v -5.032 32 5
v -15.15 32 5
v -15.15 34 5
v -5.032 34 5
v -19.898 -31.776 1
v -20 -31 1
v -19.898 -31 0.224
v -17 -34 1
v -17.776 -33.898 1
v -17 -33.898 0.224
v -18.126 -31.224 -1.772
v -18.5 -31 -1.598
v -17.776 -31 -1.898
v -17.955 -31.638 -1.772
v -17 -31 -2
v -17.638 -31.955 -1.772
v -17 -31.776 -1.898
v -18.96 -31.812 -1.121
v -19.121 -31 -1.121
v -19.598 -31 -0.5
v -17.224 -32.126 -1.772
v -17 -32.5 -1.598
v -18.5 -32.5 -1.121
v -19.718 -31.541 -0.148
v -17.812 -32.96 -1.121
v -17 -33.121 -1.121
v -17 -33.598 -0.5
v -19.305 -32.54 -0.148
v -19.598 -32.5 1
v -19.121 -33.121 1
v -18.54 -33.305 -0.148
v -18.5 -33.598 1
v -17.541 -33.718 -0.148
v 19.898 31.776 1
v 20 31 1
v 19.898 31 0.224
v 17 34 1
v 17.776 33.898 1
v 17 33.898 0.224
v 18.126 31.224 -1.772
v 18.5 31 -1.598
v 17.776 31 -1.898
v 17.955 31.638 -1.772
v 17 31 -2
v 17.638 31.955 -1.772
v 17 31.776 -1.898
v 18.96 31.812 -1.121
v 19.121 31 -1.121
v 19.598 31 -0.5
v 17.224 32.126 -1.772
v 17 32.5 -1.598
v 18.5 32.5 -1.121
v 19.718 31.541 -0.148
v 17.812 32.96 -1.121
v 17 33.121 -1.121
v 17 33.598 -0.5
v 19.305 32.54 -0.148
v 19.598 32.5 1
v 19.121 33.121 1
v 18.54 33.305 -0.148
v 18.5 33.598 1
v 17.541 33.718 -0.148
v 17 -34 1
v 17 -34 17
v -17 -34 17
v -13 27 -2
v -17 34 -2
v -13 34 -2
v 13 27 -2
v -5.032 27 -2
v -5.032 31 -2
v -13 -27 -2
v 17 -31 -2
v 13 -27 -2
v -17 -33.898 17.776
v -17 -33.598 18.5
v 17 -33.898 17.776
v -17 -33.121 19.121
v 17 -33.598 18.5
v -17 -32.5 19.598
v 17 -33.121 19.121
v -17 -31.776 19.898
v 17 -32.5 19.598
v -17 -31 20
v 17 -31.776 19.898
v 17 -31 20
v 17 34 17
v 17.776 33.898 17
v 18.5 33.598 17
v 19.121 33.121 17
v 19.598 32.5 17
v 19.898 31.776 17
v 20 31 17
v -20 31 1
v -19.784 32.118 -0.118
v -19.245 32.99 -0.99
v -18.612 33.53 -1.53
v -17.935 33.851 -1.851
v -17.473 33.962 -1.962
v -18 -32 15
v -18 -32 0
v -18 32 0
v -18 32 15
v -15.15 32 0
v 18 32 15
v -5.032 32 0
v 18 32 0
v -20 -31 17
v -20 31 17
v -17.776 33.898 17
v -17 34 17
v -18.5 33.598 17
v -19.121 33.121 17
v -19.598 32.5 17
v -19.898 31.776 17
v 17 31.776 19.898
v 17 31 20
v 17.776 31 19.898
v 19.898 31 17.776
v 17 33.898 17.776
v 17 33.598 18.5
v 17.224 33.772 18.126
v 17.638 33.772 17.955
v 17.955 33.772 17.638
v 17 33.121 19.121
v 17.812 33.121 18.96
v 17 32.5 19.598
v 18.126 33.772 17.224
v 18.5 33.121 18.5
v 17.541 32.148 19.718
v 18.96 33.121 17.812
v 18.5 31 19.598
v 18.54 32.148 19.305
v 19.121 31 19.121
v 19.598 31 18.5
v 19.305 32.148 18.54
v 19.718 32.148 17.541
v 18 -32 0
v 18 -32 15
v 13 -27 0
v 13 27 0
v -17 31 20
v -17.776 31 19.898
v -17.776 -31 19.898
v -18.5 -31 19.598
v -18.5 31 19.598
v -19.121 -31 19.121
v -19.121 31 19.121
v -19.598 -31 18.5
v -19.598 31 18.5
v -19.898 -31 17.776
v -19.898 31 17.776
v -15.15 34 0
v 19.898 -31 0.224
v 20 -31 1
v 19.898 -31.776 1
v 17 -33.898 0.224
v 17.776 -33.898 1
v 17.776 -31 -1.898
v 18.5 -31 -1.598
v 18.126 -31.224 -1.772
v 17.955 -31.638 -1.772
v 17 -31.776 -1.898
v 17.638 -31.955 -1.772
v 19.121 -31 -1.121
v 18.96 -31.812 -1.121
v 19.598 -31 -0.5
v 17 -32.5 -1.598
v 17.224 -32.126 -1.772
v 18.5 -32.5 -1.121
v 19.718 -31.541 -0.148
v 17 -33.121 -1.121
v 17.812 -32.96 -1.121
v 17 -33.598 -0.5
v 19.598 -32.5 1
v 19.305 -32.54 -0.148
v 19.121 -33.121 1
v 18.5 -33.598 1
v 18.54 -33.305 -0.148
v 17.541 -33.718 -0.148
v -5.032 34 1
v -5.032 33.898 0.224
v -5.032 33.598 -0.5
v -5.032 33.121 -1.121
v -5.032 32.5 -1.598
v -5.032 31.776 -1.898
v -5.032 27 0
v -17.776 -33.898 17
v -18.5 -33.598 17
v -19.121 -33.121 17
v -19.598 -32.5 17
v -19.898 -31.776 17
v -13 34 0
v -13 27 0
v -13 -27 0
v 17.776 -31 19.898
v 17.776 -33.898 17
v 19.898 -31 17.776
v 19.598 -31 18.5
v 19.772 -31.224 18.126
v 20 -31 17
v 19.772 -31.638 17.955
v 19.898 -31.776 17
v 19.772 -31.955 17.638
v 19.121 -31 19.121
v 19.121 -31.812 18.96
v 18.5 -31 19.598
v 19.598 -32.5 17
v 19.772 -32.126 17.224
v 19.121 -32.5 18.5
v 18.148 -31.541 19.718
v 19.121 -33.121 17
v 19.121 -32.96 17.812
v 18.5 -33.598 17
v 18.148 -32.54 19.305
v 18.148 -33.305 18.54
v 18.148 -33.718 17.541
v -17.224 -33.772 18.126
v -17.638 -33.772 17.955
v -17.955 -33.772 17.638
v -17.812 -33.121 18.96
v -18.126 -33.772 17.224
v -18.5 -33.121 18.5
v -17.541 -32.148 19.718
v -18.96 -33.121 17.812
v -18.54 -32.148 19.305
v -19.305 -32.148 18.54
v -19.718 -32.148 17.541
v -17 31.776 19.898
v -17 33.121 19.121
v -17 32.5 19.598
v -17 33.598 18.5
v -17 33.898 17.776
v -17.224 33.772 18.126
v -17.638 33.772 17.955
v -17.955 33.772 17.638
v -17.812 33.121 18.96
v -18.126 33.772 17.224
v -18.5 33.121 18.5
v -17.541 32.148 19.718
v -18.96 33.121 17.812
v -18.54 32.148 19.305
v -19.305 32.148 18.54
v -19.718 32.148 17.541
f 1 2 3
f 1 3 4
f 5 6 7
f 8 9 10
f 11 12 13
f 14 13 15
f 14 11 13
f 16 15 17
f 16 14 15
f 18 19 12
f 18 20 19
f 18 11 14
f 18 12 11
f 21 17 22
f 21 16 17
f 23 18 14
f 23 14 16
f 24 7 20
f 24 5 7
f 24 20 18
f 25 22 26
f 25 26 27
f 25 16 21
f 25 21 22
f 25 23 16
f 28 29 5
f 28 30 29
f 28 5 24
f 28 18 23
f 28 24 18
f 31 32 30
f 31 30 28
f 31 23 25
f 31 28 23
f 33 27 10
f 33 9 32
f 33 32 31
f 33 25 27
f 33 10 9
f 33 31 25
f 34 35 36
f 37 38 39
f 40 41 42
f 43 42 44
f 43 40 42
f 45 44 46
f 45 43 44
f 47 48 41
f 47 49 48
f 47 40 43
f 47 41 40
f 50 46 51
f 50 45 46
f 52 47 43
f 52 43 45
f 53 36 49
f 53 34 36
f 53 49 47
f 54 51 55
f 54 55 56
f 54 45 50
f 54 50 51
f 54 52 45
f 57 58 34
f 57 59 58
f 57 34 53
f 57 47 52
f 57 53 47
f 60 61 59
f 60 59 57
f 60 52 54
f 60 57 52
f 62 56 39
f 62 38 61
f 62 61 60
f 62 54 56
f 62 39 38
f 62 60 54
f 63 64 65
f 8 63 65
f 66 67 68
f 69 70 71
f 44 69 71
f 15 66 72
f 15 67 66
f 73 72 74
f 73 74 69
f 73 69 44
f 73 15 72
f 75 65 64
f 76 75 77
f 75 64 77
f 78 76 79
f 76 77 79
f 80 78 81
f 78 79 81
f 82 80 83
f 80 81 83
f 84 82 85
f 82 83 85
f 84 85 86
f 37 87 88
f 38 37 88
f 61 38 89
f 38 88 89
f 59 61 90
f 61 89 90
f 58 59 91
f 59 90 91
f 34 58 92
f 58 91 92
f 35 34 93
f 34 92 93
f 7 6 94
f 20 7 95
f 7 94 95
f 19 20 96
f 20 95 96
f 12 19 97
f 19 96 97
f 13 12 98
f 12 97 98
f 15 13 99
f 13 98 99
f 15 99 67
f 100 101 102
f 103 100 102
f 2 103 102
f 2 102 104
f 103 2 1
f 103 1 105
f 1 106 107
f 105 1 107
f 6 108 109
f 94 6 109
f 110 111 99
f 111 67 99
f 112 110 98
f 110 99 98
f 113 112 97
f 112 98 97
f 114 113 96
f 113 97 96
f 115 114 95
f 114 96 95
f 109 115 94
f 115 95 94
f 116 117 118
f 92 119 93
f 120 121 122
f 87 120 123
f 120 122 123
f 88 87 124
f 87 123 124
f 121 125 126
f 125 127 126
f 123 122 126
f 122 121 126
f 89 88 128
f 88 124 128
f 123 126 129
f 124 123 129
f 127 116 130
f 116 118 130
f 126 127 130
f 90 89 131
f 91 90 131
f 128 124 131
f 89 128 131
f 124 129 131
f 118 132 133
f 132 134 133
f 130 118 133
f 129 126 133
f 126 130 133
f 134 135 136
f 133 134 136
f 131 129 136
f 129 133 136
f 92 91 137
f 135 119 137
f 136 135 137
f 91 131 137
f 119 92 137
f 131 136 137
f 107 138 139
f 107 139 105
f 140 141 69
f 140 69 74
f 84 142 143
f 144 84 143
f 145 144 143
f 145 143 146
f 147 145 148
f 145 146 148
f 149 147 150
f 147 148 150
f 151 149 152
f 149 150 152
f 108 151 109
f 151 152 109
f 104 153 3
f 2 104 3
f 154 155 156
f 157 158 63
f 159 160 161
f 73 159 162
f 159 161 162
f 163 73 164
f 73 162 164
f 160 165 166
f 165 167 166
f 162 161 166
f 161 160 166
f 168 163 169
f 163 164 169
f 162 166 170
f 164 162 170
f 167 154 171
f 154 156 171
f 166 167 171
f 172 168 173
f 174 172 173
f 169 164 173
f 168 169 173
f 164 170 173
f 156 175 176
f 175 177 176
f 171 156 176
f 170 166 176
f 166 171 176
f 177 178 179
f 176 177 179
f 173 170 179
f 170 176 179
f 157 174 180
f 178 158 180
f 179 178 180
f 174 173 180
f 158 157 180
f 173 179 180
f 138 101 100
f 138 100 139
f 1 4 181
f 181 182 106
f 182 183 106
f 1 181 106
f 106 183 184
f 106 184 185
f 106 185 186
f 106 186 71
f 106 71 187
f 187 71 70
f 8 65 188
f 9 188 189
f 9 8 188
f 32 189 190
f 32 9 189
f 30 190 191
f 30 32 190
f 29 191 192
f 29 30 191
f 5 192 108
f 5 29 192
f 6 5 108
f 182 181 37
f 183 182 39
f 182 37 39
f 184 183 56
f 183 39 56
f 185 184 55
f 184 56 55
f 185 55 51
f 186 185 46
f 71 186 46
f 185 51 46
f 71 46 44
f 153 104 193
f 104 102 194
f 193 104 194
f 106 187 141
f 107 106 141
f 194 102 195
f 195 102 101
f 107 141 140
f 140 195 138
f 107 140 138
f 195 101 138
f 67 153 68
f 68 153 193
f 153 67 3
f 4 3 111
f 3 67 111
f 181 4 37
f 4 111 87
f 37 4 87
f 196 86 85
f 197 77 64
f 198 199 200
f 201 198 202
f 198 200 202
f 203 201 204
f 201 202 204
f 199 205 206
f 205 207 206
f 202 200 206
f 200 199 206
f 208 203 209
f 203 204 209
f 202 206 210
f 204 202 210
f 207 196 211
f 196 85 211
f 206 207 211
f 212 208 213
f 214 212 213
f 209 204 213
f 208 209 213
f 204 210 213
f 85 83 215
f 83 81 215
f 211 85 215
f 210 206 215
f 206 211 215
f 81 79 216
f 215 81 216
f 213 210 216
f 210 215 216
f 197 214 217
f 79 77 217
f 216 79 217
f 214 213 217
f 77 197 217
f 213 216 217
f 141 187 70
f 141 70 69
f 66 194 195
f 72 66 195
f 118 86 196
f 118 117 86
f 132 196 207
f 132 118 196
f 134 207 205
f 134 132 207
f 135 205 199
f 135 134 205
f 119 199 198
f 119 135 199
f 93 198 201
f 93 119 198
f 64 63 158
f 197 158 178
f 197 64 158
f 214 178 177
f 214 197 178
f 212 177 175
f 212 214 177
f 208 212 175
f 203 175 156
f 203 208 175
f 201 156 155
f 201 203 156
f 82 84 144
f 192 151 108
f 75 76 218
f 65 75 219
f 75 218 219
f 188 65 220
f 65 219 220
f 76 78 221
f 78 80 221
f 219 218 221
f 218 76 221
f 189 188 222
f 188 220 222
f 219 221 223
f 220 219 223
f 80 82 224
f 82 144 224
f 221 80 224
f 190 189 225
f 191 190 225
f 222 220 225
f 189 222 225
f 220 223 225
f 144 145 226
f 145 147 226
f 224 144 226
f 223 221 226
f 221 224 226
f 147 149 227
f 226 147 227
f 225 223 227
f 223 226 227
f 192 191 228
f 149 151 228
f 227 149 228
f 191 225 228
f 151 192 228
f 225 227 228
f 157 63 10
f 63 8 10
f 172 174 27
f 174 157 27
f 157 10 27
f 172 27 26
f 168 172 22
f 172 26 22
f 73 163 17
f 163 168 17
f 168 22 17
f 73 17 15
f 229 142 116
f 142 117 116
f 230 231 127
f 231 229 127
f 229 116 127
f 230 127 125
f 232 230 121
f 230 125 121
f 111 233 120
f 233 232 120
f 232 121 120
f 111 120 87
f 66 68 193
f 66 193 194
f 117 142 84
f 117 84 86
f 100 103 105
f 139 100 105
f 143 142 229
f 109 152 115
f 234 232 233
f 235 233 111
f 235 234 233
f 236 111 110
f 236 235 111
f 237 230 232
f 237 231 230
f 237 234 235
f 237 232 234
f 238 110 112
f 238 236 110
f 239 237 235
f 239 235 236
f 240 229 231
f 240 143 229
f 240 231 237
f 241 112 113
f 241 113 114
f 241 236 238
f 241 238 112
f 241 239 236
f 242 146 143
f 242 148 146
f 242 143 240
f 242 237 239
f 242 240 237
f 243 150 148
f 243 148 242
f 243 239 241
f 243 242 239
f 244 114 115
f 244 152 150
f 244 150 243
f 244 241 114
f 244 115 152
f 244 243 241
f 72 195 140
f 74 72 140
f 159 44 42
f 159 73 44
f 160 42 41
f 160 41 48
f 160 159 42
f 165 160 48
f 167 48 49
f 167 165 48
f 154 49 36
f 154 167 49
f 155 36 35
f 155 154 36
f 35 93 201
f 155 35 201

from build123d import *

# Parameters (mm, degrees)
F0_W     = 40
F0_H     = 68
F0_W_2   = 36
F0_H_2   = 64
F1_DEPTH = 20
F2_DEPTH = 15
F3_W     = 10
F3_H     = 5
F4_DEPTH = 25
F5_W     = 26
F5_H     = 54
F6_DEPTH = 2
F7_W     = 7.968329
F7_H     = 7
F8_DEPTH = 7
F9_R     = 3


with BuildPart() as f1:
    # F0 (on Top) → F1 (new body)
    with BuildSketch(Plane.XY):
        Rectangle(F0_W, F0_H)
        Rectangle(F0_W_2, F0_H_2, mode=Mode.SUBTRACT)
        Rectangle(F0_W_2, F0_H_2)
    extrude(amount=F1_DEPTH)

    # F0 (on Top) → F2 (cut)
    with BuildSketch(Plane.XY):
        Rectangle(F0_W_2, F0_H_2)
    extrude(amount=F2_DEPTH, mode=Mode.SUBTRACT)

    # F3 (on face) → F4 (cut)
    with BuildSketch(Plane(origin=(0, 34, 0), x_dir=(-1, 0, 0), z_dir=(0, 1, 0))):
        with Locations((10.149879, 2.5)):
            Rectangle(F3_W, F3_H)
    extrude(amount=-F4_DEPTH, mode=Mode.SUBTRACT)

    # F5 (on face) → F6 (join)
    with BuildSketch(Plane(origin=(0, 0, 0), x_dir=(1, 0, 0), z_dir=(0, 0, -1))):
        Polygon((20, 34), (-20, 34), (-20, -34), (-15.149879, -34), (-15.149879, -32), (-18, -32), (-18, 32), (18, 32), (18, -32), (-5.149879, -32), (-5.149879, -34), (20, -34), align=None)
        Polygon((-15.149879, -32), (-15.149879, -34), (-5.149879, -34), (-5.149879, -32), (18, -32), (18, 32), (-18, 32), (-18, -32), align=None)
        Rectangle(F5_W, F5_H, mode=Mode.SUBTRACT)
    extrude(amount=F6_DEPTH)

    # F7 (on face) → F8 (cut)
    with BuildSketch(Plane(origin=(0, 0, -2), x_dir=(1, 0, 0), z_dir=(0, 0, -1))):
        with Locations((-9.015835, -30.5)):
            Rectangle(F7_W, F7_H)
    extrude(amount=-F8_DEPTH, mode=Mode.SUBTRACT)

    # F9
    f9_edges = [f1.edges().sort_by_distance(p)[0] for p in [
        (-20, 0, 20),
        (0, -34, 20),
        (20, 0, 20),
        (0, 34, 20),
        (20, 34, 9),
        (-20, -34, 9),
        (-20, 0, -2),
        (-20, 34, 9),
        (20, -34, 9),
        (20, 0, -2),
        (0, -34, -2),
        (7.484165, 34, -2),
    ]]
    fillet(f9_edges, radius=F9_R)


solid = f1.part
